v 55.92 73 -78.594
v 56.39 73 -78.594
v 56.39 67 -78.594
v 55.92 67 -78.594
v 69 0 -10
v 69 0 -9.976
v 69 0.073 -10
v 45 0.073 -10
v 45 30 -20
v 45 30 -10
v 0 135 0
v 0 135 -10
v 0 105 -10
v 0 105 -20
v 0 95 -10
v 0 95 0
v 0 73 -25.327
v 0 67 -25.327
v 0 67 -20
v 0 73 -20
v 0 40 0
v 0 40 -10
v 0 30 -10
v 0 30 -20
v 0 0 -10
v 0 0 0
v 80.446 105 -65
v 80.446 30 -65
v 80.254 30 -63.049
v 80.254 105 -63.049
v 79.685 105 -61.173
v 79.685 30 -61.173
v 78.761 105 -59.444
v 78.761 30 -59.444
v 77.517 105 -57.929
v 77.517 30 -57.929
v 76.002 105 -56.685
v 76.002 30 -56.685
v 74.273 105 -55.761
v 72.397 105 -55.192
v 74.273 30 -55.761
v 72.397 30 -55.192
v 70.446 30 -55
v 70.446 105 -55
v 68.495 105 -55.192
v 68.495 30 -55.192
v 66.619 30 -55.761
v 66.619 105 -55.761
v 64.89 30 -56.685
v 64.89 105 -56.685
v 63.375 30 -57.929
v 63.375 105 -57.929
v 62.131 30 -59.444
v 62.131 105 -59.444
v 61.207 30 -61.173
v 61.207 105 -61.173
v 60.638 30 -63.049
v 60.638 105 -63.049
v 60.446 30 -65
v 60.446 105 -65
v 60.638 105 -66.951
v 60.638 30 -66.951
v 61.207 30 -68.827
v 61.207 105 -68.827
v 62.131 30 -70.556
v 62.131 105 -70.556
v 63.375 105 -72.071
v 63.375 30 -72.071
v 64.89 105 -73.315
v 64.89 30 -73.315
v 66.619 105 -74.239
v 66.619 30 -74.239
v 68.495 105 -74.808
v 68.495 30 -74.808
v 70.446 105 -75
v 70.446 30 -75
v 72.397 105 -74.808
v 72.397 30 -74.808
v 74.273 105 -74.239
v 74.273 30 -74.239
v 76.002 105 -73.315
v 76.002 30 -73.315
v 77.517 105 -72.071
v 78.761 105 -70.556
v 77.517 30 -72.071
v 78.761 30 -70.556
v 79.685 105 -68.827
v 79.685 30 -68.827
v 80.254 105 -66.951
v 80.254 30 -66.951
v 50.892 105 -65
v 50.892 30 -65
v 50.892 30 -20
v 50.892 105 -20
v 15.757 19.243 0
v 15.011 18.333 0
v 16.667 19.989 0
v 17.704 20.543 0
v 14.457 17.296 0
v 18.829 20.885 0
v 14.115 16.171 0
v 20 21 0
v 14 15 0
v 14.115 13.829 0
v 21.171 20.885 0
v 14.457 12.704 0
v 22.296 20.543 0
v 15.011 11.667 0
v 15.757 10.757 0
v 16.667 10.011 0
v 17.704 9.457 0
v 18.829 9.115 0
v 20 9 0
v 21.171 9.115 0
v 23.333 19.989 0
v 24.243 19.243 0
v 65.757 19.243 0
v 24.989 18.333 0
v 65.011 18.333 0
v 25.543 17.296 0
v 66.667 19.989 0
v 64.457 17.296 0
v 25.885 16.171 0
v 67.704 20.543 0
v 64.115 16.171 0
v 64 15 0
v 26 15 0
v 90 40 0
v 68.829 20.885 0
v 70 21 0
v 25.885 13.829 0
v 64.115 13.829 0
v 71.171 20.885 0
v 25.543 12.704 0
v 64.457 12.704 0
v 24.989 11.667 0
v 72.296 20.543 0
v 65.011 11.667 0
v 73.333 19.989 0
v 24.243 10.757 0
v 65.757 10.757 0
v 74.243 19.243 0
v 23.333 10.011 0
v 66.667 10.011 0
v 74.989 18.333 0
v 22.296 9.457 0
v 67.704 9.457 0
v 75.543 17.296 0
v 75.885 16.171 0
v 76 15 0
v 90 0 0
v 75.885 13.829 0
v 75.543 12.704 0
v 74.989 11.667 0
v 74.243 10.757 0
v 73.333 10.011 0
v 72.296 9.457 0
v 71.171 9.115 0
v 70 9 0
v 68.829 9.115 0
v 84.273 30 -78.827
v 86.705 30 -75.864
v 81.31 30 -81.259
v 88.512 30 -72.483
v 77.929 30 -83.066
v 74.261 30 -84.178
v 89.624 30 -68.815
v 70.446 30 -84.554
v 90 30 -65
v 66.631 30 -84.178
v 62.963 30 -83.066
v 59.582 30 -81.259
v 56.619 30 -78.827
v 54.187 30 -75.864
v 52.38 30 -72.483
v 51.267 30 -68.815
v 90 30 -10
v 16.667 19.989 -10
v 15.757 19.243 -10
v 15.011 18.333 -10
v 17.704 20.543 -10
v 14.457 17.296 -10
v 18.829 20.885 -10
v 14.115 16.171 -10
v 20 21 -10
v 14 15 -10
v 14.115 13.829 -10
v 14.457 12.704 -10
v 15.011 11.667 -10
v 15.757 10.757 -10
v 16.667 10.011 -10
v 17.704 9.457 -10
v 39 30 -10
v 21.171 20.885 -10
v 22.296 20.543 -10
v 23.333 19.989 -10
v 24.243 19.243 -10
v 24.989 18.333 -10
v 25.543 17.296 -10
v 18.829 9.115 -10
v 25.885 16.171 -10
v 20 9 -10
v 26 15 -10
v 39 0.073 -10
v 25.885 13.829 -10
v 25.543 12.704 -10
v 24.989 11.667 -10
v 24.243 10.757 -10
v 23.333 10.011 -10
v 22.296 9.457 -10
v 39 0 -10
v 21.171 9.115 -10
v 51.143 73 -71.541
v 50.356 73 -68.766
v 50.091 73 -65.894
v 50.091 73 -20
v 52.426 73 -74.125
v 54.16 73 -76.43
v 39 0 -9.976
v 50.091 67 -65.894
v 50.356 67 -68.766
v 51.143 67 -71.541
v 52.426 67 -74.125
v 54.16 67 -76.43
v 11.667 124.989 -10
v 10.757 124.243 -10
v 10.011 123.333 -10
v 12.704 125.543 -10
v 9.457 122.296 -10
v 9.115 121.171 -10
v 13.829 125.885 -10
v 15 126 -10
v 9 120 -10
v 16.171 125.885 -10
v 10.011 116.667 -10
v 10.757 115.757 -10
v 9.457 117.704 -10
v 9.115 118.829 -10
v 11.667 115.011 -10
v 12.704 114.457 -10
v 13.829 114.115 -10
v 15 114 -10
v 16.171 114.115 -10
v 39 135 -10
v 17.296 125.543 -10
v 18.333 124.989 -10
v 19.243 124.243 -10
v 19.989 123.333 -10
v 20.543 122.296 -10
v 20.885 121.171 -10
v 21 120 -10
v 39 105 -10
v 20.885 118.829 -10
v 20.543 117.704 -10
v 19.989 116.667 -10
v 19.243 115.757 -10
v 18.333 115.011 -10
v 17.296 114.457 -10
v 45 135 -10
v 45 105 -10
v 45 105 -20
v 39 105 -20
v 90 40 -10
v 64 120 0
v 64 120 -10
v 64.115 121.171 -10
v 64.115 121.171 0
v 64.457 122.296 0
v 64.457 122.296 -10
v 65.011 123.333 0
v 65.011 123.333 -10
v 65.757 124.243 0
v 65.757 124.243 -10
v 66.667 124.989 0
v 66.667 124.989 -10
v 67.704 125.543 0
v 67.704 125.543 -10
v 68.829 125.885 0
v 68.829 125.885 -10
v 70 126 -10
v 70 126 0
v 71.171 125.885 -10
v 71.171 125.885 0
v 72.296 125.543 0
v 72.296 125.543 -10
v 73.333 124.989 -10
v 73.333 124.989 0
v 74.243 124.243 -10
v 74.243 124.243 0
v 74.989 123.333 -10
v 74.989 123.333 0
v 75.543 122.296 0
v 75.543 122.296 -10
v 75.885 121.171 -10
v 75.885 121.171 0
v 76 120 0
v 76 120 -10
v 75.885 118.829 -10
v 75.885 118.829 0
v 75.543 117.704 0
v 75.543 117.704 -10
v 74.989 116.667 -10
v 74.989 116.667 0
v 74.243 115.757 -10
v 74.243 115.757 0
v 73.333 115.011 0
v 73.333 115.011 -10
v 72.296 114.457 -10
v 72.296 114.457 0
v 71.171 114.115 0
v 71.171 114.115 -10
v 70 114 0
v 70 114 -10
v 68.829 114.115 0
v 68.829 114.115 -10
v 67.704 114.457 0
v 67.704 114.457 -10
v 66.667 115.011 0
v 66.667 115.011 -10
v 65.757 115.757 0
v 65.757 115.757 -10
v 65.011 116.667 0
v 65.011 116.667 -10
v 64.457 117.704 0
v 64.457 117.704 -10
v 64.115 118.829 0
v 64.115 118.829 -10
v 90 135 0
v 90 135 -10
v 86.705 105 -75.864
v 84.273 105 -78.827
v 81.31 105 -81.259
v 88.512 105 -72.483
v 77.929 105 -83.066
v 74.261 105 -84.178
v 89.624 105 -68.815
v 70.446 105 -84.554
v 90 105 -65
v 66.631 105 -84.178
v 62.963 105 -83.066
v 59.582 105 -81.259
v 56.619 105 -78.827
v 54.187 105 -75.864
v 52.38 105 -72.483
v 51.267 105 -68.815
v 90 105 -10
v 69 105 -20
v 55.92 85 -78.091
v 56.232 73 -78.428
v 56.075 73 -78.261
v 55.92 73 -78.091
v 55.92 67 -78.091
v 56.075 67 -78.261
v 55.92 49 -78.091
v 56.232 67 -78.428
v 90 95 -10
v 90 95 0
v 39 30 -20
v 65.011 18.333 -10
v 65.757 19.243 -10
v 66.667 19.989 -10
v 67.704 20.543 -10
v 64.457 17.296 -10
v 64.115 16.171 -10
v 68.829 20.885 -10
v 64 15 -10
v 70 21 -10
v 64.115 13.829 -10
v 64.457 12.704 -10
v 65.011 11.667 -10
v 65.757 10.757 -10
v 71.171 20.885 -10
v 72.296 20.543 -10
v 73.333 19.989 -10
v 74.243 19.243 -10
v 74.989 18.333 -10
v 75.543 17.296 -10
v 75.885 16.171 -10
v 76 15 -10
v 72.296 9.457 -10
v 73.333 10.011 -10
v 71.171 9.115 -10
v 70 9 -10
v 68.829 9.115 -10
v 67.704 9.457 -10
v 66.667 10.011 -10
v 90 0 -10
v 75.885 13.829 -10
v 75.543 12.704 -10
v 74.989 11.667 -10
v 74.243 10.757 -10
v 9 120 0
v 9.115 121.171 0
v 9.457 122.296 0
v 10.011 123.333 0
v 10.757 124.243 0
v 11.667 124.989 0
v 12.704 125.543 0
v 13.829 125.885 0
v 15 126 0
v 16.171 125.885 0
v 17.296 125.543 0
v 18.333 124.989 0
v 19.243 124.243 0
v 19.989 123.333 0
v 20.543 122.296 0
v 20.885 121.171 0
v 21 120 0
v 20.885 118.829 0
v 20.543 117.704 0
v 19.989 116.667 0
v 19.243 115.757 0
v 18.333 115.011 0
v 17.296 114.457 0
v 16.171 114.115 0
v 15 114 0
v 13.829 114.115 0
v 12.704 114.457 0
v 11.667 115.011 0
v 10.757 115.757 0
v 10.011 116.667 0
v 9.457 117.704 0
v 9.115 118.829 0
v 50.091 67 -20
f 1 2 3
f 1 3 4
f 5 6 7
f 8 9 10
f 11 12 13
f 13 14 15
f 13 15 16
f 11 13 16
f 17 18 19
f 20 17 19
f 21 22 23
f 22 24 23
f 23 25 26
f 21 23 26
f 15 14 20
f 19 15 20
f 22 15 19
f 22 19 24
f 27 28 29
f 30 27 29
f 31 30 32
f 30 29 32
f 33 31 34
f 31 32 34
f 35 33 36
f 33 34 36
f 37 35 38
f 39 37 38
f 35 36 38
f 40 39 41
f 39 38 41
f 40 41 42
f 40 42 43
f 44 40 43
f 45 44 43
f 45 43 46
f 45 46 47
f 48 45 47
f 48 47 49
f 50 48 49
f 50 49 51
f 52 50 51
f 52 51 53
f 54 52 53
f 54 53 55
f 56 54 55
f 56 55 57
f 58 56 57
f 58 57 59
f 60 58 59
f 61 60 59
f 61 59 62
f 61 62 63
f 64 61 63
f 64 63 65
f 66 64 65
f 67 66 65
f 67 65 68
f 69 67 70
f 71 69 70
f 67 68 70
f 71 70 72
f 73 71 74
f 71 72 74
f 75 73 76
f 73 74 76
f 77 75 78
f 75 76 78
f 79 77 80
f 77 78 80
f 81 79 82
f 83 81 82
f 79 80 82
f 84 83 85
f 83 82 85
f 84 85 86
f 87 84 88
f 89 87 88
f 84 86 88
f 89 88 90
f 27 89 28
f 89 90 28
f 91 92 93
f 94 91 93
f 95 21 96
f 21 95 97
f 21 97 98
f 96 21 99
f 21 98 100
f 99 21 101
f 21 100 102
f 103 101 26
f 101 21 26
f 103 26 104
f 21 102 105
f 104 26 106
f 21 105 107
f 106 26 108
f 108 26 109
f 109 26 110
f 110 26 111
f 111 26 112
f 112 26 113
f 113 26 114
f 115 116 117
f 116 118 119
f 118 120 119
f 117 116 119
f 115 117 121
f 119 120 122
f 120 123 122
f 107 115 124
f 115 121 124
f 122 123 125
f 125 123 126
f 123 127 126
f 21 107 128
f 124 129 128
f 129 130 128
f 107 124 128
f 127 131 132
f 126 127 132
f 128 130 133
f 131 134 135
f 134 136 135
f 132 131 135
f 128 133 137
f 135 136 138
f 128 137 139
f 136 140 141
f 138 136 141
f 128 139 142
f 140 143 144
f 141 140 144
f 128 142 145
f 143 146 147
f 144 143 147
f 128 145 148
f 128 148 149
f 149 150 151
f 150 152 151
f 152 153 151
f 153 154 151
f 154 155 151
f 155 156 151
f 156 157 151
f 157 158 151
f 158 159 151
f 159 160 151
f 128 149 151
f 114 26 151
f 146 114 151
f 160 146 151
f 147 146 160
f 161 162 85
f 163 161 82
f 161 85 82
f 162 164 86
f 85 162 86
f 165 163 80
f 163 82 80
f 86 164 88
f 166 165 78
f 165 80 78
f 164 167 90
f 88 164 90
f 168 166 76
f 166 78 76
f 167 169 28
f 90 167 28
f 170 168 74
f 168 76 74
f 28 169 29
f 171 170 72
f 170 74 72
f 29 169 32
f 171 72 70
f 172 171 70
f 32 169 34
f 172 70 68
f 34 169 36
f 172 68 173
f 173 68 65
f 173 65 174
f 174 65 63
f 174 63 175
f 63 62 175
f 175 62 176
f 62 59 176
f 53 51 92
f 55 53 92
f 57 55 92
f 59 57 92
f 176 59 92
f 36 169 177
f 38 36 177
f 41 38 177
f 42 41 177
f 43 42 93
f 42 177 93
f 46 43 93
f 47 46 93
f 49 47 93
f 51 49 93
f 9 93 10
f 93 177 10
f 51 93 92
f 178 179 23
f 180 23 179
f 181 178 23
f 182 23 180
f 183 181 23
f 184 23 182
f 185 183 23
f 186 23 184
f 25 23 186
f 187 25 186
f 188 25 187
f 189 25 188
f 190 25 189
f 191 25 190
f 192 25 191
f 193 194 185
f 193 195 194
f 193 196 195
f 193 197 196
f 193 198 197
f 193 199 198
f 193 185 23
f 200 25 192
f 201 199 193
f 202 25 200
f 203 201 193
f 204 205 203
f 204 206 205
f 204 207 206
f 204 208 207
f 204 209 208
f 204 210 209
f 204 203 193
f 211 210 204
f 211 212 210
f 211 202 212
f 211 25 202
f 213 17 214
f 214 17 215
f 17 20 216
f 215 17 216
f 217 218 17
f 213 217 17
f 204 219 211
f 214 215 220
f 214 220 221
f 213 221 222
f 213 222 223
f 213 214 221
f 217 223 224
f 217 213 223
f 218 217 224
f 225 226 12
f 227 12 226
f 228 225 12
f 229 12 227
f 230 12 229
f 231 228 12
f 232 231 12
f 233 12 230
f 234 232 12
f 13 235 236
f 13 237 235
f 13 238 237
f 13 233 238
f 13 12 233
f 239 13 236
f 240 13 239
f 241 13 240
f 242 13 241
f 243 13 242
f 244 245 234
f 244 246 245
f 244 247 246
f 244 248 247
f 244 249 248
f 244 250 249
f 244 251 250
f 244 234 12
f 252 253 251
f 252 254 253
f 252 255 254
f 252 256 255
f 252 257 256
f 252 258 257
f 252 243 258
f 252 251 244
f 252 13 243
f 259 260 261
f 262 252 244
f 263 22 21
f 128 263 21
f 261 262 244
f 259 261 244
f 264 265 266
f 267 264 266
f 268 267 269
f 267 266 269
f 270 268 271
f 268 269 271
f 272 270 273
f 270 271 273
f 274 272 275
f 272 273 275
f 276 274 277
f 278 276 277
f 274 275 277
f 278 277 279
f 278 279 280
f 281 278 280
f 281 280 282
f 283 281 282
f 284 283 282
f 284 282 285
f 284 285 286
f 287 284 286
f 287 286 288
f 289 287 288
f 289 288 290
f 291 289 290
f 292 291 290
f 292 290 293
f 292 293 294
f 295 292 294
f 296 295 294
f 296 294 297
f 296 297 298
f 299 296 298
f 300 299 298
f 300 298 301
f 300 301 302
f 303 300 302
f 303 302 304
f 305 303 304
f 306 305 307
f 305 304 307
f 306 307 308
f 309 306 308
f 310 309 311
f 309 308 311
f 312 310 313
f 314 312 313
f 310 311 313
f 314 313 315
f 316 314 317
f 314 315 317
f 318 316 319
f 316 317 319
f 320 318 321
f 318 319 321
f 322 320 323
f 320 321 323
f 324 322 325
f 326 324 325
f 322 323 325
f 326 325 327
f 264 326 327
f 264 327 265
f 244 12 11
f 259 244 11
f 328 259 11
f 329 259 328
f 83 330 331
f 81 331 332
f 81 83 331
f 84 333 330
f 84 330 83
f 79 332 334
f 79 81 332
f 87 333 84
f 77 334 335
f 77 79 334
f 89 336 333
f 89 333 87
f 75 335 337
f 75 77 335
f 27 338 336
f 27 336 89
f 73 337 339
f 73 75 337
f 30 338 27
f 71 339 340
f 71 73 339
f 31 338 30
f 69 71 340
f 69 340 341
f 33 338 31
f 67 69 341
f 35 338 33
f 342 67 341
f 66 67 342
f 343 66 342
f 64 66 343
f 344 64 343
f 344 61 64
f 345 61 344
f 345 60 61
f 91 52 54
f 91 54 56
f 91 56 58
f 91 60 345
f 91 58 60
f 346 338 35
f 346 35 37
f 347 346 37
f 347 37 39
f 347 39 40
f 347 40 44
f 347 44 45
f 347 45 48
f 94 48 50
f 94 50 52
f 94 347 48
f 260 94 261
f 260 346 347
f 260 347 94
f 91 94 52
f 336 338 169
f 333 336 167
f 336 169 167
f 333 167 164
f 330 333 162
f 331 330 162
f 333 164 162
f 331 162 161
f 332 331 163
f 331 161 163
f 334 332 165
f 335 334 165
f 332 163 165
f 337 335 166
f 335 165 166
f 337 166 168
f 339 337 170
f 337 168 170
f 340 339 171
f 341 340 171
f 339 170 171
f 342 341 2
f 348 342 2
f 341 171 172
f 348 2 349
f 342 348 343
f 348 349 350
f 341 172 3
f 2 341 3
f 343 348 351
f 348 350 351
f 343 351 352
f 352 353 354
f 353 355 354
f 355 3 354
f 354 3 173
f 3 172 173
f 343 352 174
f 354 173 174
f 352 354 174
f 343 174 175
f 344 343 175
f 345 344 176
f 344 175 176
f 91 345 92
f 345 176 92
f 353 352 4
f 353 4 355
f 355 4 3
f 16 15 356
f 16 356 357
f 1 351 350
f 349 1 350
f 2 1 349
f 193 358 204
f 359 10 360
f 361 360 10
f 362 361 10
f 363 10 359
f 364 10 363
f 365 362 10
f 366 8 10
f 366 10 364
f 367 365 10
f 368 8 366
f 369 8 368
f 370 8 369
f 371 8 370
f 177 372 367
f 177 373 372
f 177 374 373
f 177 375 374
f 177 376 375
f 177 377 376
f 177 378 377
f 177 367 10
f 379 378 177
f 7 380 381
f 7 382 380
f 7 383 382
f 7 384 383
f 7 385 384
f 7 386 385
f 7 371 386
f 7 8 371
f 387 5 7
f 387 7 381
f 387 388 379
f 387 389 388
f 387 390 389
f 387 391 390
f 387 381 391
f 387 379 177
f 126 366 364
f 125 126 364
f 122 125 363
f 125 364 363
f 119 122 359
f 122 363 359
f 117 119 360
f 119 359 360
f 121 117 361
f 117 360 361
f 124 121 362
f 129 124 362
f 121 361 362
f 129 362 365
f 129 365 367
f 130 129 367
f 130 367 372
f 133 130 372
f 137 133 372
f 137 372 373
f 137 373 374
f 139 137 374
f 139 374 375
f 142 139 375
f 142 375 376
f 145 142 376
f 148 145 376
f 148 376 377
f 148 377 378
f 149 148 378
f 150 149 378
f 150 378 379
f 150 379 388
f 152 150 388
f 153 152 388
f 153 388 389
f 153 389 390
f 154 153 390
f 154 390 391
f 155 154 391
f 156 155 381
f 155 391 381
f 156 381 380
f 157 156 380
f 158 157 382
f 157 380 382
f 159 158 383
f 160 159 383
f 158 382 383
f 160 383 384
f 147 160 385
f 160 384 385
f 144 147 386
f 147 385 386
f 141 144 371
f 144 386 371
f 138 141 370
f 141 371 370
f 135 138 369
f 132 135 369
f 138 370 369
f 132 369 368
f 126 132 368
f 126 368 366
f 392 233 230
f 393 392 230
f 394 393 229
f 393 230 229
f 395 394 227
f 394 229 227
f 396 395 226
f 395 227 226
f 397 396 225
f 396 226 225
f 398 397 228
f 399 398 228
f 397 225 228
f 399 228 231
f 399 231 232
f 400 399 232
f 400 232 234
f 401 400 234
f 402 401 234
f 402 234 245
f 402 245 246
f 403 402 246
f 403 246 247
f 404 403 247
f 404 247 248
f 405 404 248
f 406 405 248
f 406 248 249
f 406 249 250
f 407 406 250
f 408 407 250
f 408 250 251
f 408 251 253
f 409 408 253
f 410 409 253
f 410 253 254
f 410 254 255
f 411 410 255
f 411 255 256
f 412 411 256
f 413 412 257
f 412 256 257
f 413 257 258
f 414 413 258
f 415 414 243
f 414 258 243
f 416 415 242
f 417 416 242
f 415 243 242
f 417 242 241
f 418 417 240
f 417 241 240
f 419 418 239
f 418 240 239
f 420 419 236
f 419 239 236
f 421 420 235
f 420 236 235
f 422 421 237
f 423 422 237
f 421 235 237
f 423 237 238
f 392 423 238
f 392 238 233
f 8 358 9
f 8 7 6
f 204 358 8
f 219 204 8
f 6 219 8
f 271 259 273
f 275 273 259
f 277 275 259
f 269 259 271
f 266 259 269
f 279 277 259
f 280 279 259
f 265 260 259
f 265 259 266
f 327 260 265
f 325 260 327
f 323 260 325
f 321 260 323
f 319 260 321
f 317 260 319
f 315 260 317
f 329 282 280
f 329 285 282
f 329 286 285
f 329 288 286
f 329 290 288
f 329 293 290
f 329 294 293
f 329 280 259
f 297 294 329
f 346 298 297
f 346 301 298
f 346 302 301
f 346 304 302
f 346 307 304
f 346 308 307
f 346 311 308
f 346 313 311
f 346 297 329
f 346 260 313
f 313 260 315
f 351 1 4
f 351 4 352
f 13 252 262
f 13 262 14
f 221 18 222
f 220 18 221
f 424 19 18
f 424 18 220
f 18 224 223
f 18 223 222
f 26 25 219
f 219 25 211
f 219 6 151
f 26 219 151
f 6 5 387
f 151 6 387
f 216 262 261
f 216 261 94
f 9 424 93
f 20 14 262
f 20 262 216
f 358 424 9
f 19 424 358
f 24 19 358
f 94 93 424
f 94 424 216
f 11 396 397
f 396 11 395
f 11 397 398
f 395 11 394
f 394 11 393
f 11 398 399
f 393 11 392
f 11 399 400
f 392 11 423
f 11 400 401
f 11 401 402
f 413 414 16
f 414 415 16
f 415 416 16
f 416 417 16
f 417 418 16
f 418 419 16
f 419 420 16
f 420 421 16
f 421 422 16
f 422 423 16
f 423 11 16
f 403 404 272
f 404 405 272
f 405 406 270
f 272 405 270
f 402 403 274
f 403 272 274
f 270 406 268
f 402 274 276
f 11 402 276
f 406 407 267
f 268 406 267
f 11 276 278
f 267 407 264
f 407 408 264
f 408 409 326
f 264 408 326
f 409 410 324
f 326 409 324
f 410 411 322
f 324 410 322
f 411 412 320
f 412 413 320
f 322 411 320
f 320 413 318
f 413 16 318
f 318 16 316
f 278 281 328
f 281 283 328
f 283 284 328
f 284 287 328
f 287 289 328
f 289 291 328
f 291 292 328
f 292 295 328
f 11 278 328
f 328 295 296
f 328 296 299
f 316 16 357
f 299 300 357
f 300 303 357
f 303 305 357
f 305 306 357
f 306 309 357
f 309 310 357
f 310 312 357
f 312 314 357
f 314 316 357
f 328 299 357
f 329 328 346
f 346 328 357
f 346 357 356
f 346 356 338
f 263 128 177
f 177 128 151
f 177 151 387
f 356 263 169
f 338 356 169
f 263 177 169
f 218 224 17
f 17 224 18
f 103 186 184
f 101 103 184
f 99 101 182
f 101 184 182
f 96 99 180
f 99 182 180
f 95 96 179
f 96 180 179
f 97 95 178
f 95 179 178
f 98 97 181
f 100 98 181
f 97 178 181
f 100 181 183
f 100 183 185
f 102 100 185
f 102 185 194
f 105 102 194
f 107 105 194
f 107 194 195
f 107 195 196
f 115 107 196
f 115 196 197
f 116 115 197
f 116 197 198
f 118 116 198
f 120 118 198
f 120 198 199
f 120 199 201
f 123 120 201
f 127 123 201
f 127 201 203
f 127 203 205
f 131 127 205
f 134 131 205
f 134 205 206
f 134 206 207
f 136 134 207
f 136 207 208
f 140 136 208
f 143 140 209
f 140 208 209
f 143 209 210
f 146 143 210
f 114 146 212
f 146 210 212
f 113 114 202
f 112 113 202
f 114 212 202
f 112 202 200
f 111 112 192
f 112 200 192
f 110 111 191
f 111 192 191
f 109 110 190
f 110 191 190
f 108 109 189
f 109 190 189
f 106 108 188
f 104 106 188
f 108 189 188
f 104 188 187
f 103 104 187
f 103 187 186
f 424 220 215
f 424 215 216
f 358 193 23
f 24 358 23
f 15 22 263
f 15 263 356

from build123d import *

# Parameters (mm, degrees)
SKETCH4_W           = 90
SKETCH4_H           = 10
BOSS_EXTRUDE3_DEPTH = 135
BOSS_EXTRUDE4_DEPTH = 90
SKETCH6_W           = 10
SKETCH6_H           = 55
CUT_EXTRUDE3_DEPTH  = 130
BOSS_EXTRUDE5_DEPTH = 75
SKETCH8_R           = 10
CUT_EXTRUDE4_DEPTH  = 95
SKETCH11_R          = 6
CUT_EXTRUDE5_DEPTH  = 95
SKETCH12_R          = 6
CUT_EXTRUDE6_DEPTH  = 95
SKETCH13_W          = 6
SKETCH13_H          = 10
BOSS_EXTRUDE6_DEPTH = 30
CUT_EXTRUDE7_DEPTH  = 30
BOSS_EXTRUDE7_DEPTH = 3
CUT_EXTRUDE10_DEPTH = 18
SKETCH18_W          = 6
SKETCH18_H          = 10
BOSS_EXTRUDE8_DEPTH = 30
CUT_EXTRUDE11_DEPTH = 30
SKETCH20_W          = 50.090708896
SKETCH20_H          = 1.471886497
BOSS_EXTRUDE9_DEPTH = 6
SKETCH21_W          = 9.793244498
SKETCH21_H          = 5.326709205
CUT_EXTRUDE12_DEPTH = 6


with BuildPart() as part:
    # Sketch4 → Boss-Extrude3 (new body)
    with BuildSketch(Plane(origin=(0, 0, 0), x_dir=(1, 0, 0), z_dir=(0, 1, 0))):
        with Locations((45, 5)):
            Rectangle(SKETCH4_W, SKETCH4_H)
    extrude(amount=BOSS_EXTRUDE3_DEPTH)

    # Sketch5 → Boss-Extrude4 (add)
    with BuildSketch(Plane(origin=(0, 0, 0), x_dir=(0, 0, -1), z_dir=(1, 0, 0))):
        Polygon((0, 0), (0, 40), (10, 40), (10, 95), (0, 95), (0, 135), (10, 135), (10, 105), (20, 105), (20, 30), (10, 30), (10, 0), align=None)
    extrude(amount=BOSS_EXTRUDE4_DEPTH)

    # Sketch6 → Cut-Extrude3 (cut)
    with BuildSketch(Plane.ZY):
        with Locations((-5, 67.5)):
            Rectangle(SKETCH6_W, SKETCH6_H)
    extrude(amount=-CUT_EXTRUDE3_DEPTH, mode=Mode.SUBTRACT)

    # Sketch7 → Boss-Extrude5 (add)
    with BuildSketch(Plane.XZ.offset(-30)):
        with BuildLine():
            Line((90, -20), (90, -65))
            ThreePointArc((90, -65), (70.445832322, -84.554167678), (50.891664643, -65))
            Line((50.891664643, -65), (50.891664643, -20))
            Line((50.891664643, -20), (90, -20))
        make_face()
    extrude(amount=-BOSS_EXTRUDE5_DEPTH)

    # Sketch8 → Cut-Extrude4 (cut)
    with BuildSketch(Plane.XZ.offset(-30)):
        with Locations((70.445832322, -65)):
            Circle(SKETCH8_R)
    extrude(amount=-CUT_EXTRUDE4_DEPTH, mode=Mode.SUBTRACT)

    # Sketch11 → Cut-Extrude5 (cut)
    with BuildSketch(Plane(origin=(0, 0, -10), x_dir=(-1, 0, 0), z_dir=(0, 0, -1))):
        with Locations((-70, 15)):
            Circle(SKETCH11_R)
        with Locations((-20, 15)):
            Circle(SKETCH11_R)
    extrude(amount=-CUT_EXTRUDE5_DEPTH, mode=Mode.SUBTRACT)

    # Sketch12 → Cut-Extrude6 (cut)
    with BuildSketch(Plane(origin=(0, 0, -10), x_dir=(-1, 0, 0), z_dir=(0, 0, -1))):
        with Locations((-70, 120)):
            Circle(SKETCH12_R)
        with Locations((-15, 120)):
            Circle(SKETCH12_R)
    extrude(amount=-CUT_EXTRUDE6_DEPTH, mode=Mode.SUBTRACT)

    # Sketch13 → Boss-Extrude6 (add)
    with BuildSketch(Plane.XZ.offset(-30)):
        with Locations((42, -15)):
            Rectangle(SKETCH13_W, SKETCH13_H)
    extrude(amount=BOSS_EXTRUDE6_DEPTH)

    # Sketch14 → Cut-Extrude7 (cut)
    with BuildSketch(Plane.ZY.offset(-39)):
        Polygon((-20, 30), (-9.033737426, -2.819084872), (-23.067852081, -4.027904728), (-23.067852081, 30), align=None)
    extrude(amount=-CUT_EXTRUDE7_DEPTH, mode=Mode.SUBTRACT)

    # Sketch16 → Boss-Extrude7 (add, symmetric)
    with BuildSketch(Plane(origin=(0, 70, 0), x_dir=(1, 0, 0), z_dir=(0, 1, 0))):
        with BuildLine():
            Line((50.090708896, 21.471886497), (50.090708896, 65.894352206))
            ThreePointArc((50.090708896, 65.894352206), (51.806699753, 73.025071947), (56.578931041, 78.594416359))
            Line((56.578931041, 78.594416359), (-4.085392515, 78.594416359))
            Line((-4.085392515, 78.594416359), (-4.085392515, 21.471886497))
            Line((-4.085392515, 21.471886497), (50.090708896, 21.471886497))
        make_face()
    extrude(amount=BOSS_EXTRUDE7_DEPTH, both=True)

    # Sketch17 → Cut-Extrude10 (cut, symmetric)
    with BuildSketch(Plane.XZ.offset(-67)):
        Polygon((55.920281495, -78.090983416), (-4.085392515, -21.471886497), (-4.085392515, -120.610546036), (55.920281495, -116.406239738), align=None)
    extrude(amount=CUT_EXTRUDE10_DEPTH, both=True, mode=Mode.SUBTRACT)

    # Sketch18 → Boss-Extrude8 (add)
    with BuildSketch(Plane(origin=(0, 105, 0), x_dir=(1, 0, 0), z_dir=(0, 1, 0))):
        with Locations((42, 15)):
            Rectangle(SKETCH18_W, SKETCH18_H)
    extrude(amount=BOSS_EXTRUDE8_DEPTH)

    # Sketch19 → Cut-Extrude11 (cut)
    with BuildSketch(Plane.ZY.offset(-39)):
        Polygon((-20, 105), (-10, 135), (-32.228945025, 136.35277526), (-34.026284176, 106.818709731), align=None)
    extrude(amount=-CUT_EXTRUDE11_DEPTH, mode=Mode.SUBTRACT)

    # Sketch20 → Boss-Extrude9 (add)
    with BuildSketch(Plane.XZ.offset(-67)):
        with Locations((25.045354448, -20.735943248)):
            Rectangle(SKETCH20_W, SKETCH20_H)
    extrude(amount=-BOSS_EXTRUDE9_DEPTH)

    # Sketch21 → Cut-Extrude12 (cut)
    with BuildSketch(Plane.XZ.offset(-67)):
        with Locations((-4.896622249, -22.663354603)):
            Rectangle(SKETCH21_W, SKETCH21_H)
    extrude(amount=-CUT_EXTRUDE12_DEPTH, mode=Mode.SUBTRACT)


solid = part.part
